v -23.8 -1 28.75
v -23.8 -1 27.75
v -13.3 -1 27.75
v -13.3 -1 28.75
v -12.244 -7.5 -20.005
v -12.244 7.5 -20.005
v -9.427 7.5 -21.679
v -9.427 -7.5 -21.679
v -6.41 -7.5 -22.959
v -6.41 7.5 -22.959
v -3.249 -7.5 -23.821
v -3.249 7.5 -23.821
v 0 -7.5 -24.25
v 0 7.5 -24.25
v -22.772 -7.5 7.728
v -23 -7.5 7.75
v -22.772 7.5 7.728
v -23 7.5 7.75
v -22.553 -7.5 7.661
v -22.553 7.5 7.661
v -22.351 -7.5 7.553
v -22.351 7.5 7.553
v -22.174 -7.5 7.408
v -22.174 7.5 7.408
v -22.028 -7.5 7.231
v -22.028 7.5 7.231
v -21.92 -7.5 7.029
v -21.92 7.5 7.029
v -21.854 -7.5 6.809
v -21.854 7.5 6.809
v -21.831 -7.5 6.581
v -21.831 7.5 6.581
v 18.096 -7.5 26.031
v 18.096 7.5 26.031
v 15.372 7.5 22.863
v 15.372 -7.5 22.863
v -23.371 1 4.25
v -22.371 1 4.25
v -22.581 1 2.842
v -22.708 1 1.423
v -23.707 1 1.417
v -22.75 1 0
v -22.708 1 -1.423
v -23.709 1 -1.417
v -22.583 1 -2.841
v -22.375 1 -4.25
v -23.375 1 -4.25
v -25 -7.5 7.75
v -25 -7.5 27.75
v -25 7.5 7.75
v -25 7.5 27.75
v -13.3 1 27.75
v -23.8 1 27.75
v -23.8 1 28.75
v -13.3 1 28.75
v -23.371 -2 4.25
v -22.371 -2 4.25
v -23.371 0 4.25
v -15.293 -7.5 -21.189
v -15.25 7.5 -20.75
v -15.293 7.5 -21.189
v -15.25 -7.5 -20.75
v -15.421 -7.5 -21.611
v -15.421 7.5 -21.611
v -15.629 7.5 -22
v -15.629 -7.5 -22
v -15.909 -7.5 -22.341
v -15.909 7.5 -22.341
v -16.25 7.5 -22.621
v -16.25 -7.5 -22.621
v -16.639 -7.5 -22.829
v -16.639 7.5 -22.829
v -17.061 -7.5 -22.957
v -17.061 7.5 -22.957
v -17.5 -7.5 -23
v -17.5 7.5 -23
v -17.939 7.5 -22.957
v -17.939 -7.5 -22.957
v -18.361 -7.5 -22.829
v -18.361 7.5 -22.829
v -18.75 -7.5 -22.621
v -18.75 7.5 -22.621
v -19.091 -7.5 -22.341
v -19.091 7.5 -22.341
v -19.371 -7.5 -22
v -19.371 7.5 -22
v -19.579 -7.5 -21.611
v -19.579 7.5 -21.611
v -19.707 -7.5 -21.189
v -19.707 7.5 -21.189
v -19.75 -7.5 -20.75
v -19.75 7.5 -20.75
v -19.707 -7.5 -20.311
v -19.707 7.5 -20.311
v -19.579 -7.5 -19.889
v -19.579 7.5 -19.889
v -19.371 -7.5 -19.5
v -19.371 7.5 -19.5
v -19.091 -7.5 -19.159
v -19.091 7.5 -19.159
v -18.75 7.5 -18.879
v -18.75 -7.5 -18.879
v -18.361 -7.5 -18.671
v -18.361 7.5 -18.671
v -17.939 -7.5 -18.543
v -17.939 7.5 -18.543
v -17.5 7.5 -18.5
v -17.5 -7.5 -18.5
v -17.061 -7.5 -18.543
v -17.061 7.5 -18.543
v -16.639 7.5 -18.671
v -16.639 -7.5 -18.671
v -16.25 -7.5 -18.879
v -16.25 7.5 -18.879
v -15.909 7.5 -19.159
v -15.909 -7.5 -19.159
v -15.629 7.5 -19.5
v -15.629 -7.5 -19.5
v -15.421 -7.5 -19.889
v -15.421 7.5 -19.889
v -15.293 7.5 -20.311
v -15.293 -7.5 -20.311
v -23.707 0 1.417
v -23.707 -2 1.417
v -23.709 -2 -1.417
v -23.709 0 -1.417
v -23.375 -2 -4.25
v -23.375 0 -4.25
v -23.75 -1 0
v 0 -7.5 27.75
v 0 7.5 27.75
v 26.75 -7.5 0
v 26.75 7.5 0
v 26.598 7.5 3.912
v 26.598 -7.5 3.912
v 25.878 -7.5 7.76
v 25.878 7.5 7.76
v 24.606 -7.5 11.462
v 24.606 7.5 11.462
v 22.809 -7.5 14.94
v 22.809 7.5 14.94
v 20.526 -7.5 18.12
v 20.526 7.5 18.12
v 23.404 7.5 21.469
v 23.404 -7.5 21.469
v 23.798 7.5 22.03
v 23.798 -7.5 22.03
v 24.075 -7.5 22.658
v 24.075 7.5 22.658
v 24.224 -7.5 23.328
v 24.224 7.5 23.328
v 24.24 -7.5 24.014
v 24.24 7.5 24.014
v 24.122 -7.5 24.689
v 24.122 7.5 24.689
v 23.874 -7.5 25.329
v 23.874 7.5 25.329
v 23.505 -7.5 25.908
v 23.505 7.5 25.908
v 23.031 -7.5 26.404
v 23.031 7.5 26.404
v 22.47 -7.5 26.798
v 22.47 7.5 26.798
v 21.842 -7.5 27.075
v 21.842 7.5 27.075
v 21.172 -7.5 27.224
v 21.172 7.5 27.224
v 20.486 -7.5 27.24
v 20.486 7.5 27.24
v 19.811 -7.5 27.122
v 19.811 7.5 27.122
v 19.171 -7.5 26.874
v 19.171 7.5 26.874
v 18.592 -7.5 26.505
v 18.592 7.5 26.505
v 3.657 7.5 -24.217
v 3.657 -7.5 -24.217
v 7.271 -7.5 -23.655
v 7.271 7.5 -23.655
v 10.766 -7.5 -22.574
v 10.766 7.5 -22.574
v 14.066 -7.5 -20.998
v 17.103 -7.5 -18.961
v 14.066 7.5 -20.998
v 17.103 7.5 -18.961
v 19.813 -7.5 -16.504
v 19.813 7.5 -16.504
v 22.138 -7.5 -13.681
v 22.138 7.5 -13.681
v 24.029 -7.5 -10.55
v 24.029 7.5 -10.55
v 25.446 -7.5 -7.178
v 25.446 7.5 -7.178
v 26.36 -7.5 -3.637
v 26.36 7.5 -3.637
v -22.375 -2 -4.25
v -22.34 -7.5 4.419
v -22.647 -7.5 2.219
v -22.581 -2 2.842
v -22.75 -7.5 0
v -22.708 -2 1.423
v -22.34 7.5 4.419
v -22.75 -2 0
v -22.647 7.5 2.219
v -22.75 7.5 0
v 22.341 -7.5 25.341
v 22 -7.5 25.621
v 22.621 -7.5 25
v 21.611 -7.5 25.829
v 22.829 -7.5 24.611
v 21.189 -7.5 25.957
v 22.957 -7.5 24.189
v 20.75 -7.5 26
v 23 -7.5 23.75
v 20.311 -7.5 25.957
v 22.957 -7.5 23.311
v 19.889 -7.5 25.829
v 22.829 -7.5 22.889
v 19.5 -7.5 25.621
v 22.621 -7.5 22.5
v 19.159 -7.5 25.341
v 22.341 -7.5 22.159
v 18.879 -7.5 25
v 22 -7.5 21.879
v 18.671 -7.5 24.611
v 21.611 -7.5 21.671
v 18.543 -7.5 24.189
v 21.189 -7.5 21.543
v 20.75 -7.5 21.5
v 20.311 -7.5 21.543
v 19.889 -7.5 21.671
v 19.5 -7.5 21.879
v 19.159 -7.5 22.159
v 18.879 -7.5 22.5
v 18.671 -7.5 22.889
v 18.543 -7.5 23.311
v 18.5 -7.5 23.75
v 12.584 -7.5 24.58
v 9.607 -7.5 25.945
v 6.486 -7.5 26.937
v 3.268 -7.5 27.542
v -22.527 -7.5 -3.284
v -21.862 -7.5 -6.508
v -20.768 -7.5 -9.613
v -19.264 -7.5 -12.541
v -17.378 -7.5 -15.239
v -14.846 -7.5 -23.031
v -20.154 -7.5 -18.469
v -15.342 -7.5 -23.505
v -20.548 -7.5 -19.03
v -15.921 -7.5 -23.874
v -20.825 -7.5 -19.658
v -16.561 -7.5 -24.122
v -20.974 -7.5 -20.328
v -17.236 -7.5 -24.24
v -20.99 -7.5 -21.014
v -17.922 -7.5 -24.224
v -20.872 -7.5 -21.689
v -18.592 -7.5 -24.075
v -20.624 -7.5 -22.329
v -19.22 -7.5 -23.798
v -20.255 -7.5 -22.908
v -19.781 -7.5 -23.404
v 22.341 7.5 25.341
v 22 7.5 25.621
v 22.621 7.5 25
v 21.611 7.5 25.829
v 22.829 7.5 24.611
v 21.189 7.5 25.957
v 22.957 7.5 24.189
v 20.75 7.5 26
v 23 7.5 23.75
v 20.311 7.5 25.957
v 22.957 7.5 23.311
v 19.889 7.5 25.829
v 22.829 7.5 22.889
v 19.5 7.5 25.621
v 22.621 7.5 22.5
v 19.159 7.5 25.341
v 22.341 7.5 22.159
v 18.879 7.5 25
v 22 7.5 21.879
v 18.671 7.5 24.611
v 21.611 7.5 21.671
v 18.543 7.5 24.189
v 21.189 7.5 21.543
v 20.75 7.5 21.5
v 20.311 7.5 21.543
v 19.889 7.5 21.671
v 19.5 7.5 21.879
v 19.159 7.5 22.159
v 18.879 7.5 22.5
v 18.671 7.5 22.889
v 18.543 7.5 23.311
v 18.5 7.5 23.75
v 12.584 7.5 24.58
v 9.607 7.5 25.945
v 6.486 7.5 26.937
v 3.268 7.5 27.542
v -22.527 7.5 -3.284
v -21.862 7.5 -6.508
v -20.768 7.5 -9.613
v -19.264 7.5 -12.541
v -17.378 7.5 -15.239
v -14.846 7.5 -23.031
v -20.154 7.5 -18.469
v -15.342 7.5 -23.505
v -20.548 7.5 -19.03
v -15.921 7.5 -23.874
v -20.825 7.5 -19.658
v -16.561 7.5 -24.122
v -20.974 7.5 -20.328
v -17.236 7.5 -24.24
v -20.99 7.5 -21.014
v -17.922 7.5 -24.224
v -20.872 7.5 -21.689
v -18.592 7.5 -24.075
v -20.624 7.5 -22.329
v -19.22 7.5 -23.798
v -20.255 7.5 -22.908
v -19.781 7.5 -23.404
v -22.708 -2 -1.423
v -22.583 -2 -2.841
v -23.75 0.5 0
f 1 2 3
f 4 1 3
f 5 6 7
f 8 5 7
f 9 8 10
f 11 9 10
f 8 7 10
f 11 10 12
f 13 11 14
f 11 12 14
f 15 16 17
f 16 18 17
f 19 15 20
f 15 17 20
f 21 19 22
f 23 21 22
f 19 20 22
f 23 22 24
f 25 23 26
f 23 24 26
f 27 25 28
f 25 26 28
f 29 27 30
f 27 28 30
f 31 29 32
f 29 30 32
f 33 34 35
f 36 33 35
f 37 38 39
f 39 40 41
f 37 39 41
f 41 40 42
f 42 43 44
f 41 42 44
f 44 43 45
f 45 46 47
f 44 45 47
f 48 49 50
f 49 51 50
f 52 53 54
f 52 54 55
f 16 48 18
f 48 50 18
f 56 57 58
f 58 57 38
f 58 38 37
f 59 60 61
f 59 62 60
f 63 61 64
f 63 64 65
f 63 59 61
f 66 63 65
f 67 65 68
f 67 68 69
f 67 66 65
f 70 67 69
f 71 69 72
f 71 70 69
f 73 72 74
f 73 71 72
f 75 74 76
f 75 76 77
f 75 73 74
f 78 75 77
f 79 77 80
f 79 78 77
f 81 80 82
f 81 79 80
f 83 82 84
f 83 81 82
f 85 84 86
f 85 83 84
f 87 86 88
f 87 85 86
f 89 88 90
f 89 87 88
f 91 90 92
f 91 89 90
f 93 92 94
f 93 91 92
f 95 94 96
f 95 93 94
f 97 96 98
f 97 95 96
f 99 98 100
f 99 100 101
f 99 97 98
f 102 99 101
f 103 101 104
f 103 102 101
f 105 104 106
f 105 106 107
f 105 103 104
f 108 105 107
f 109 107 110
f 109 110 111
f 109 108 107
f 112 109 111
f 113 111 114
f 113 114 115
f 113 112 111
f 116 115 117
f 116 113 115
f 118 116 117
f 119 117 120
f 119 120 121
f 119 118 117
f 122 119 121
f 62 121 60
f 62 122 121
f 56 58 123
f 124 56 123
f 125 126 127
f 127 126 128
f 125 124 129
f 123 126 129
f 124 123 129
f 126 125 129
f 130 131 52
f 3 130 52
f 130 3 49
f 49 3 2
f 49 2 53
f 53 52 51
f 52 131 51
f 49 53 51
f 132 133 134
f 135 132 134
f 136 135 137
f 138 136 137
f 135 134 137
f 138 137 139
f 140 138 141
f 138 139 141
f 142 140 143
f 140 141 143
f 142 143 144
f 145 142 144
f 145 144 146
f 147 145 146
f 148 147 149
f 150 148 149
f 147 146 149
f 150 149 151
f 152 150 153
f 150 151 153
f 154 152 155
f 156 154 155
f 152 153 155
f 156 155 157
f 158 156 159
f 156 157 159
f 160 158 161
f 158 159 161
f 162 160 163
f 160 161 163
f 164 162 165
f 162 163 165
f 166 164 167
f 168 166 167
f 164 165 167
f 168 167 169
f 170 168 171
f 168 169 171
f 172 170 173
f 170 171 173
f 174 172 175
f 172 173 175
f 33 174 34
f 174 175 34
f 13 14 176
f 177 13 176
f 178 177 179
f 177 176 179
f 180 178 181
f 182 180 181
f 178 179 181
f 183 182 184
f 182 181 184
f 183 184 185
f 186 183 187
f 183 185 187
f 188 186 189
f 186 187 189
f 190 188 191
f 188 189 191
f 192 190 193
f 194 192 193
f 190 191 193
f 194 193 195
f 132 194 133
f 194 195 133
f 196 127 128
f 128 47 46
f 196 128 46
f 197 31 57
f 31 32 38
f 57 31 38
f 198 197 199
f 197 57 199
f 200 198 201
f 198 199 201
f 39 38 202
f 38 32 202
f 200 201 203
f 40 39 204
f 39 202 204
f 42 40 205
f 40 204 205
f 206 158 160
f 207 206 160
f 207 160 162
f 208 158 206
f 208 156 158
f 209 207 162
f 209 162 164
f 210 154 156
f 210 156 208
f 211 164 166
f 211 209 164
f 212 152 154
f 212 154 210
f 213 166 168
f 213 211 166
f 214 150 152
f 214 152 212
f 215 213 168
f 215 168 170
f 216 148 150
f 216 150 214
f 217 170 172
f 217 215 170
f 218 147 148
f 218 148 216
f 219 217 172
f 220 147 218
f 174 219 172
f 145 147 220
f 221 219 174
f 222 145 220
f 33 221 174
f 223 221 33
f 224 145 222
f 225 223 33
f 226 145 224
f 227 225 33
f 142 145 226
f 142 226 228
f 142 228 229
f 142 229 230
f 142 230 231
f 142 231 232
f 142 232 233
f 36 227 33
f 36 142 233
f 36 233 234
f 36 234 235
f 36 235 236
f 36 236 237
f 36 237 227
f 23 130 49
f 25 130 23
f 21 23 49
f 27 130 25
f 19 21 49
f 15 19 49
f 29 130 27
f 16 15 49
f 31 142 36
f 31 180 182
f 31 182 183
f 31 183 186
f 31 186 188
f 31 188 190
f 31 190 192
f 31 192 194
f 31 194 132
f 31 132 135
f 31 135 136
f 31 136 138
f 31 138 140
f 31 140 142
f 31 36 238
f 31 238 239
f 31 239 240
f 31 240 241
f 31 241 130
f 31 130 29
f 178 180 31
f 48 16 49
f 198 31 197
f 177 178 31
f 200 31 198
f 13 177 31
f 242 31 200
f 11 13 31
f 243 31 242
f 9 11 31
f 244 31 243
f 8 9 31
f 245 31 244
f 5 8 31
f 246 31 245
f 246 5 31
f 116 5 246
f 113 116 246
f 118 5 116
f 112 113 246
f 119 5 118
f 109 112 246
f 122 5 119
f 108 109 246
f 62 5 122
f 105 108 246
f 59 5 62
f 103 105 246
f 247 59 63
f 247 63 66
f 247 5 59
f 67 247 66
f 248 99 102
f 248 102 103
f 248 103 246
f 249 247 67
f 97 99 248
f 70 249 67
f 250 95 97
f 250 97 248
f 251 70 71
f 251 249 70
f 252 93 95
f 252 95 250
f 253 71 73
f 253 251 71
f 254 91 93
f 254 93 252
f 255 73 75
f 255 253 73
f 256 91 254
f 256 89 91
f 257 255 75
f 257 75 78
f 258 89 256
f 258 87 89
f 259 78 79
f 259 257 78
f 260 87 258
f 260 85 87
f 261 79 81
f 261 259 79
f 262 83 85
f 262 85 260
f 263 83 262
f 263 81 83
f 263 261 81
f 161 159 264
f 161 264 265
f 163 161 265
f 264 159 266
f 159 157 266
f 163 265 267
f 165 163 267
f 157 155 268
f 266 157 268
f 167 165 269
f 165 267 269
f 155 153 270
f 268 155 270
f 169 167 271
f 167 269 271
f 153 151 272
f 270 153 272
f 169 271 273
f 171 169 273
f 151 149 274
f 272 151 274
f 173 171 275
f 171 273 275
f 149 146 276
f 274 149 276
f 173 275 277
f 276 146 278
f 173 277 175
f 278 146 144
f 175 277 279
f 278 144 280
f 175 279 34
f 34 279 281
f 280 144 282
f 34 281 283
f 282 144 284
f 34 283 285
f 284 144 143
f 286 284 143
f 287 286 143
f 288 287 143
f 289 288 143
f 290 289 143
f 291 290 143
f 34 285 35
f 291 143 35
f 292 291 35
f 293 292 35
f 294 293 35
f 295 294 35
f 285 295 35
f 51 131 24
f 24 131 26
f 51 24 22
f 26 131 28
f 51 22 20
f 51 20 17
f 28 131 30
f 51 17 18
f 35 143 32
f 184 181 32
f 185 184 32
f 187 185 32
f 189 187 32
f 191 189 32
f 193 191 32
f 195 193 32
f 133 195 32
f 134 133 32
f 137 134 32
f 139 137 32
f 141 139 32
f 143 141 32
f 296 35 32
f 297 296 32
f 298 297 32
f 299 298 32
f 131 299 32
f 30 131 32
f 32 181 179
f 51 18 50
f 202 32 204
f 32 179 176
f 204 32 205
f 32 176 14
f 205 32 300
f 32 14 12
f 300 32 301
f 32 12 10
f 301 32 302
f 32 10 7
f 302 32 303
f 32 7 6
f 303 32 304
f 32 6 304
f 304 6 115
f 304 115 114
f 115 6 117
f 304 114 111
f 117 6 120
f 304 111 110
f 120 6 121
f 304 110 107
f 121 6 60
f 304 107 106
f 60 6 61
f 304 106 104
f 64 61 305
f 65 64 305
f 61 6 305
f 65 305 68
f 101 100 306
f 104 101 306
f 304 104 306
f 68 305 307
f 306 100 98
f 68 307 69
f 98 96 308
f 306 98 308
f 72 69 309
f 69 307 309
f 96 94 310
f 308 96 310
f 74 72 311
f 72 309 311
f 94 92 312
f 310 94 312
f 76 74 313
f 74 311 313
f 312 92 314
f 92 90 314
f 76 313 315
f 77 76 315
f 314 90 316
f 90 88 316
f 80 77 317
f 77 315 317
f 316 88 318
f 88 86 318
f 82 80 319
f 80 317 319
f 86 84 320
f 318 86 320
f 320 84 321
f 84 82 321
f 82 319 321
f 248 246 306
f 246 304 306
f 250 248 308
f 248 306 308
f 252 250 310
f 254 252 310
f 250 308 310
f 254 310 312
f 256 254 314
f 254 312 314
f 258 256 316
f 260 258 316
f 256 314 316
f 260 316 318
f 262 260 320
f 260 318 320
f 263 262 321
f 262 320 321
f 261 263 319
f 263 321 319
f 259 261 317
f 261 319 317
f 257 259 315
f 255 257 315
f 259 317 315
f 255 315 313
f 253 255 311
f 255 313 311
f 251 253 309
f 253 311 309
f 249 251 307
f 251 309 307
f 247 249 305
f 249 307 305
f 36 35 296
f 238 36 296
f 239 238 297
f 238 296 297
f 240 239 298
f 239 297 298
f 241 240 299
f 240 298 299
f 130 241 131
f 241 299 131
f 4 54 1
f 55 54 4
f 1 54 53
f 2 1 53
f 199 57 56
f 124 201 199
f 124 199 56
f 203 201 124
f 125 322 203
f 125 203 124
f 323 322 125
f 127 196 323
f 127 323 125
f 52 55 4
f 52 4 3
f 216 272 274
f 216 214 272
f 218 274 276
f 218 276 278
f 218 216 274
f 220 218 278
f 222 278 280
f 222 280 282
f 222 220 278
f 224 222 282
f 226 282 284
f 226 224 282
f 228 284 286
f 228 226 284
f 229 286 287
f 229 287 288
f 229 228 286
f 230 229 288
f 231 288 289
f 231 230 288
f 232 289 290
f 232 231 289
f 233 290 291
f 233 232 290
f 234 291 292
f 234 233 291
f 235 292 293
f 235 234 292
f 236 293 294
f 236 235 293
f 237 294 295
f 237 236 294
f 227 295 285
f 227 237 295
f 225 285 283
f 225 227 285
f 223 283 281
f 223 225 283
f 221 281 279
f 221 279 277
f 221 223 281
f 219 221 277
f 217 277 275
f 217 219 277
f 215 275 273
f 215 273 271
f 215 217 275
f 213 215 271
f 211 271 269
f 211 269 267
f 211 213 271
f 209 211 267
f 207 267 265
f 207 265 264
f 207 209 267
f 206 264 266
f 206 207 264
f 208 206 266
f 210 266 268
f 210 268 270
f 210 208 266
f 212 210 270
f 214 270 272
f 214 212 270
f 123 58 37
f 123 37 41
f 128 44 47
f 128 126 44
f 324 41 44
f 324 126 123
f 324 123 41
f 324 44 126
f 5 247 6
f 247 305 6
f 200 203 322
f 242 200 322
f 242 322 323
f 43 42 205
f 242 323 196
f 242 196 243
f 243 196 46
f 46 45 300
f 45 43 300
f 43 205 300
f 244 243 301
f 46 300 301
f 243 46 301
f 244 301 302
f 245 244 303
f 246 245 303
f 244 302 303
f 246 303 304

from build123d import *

# Parameters (mm, degrees)
BOSS_EXTRUDE1_DEPTH      = 7.5
BOSS_EXTRUDE1_DEPTH_BACK = 7.5
SKETCH1_R                = 2.25
BOSS_EXTRUDE2_DEPTH      = 1
BOSS_EXTRUDE2_DEPTH_BACK = 2
BOSS_EXTRUDE3_DEPTH      = 1
BOSS_EXTRUDE3_DEPTH_BACK = 1
SKETCH3_W                = 10.5
SKETCH3_H                = 1


with BuildPart() as part:
    # Sketch1 → Boss-Extrude1 (new, two sides: drawn at the far end of the back side and taken through both)
    with BuildSketch(Plane(origin=(0, 0, 0), x_dir=(1, 0, 0), z_dir=(0, 1, 0)).offset(-BOSS_EXTRUDE1_DEPTH_BACK)):
        with BuildLine():
            Line((0, -27.75), (-25, -27.75))
            Line((-25, -27.75), (-25, -7.75))
            Line((-25, -7.75), (-23, -7.75))
            ThreePointArc((-23, -7.75), (-22.173642142, -7.407711368), (-21.83135351, -6.58135351))
            ThreePointArc((-21.83135351, -6.58135351), (-22.519230493, -3.322579021), (-22.75, 0))
            ThreePointArc((-22.75, 0), (-21.367673649, 8.078905587), (-17.377967793, 15.238639437))
            Line((-17.377967793, 15.238639437), (-20.154237836, 18.468548377))
            ThreePointArc((-20.154237836, 18.468548377), (-19.781451623, 23.404237836), (-14.845762164, 23.031451623))
            Line((-14.845762164, 23.031451623), (-12.244288682, 20.004900775))
            ThreePointArc((-12.244288682, 20.004900775), (-6.410360065, 22.958761116), (0, 24.25))
            ThreePointArc((0, 24.25), (18.502982119, 17.781640069), (26.75, 0))
            ThreePointArc((26.75, 0), (25.310000225, -9.634196337), (20.525571791, -18.119512063))
            Line((20.525571791, -18.119512063), (23.404237836, -21.468548377))
            ThreePointArc((23.404237836, -21.468548377), (23.031451623, -26.404237836), (18.095762164, -26.031451623))
            Line((18.095762164, -26.031451623), (15.372148216, -22.862802716))
            ThreePointArc((15.372148216, -22.862802716), (8.06198842, -26.488798996), (0, -27.75))
        make_face()
        with Locations((-17.5, 20.75)):
            Circle(SKETCH1_R, mode=Mode.SUBTRACT)
        with Locations((20.75, -23.75)):
            Circle(SKETCH1_R, mode=Mode.SUBTRACT)
    extrude(amount=BOSS_EXTRUDE1_DEPTH + BOSS_EXTRUDE1_DEPTH_BACK)

    # Sketch2 → Boss-Extrude2 (add, two sides: drawn at the far end of the back side and taken through both)
    with BuildSketch(Plane(origin=(0, 0, 0), x_dir=(1, 0, 0), z_dir=(0, 1, 0)).offset(-BOSS_EXTRUDE2_DEPTH_BACK)):
        with BuildLine():
            Line((-23.375448552, 4.25), (-22.375448552, 4.25))
            Line((-22.375448552, 4.25), (-20.476060309, 3.242316336))
            Line((-20.476060309, 3.242316336), (-20.106924084, -2.963786455))
            Line((-20.106924084, -2.963786455), (-22.3712513, -4.25))
            Line((-22.3712513, -4.25), (-23.3712513, -4.25))
            add(Edge.make_bspline(
                [(-23.3712513, -4.25), (-24.126649893, -0.000369077), (-23.375448552, 4.25)],
                knots=[0, 0, 0, 1, 1, 1], degree=2))
        make_face()
    extrude(amount=BOSS_EXTRUDE2_DEPTH + BOSS_EXTRUDE2_DEPTH_BACK)

    # Sketch3 → Boss-Extrude3 (add, two sides: drawn at the far end of the back side and taken through both)
    with BuildSketch(Plane(origin=(0, 0, 0), x_dir=(1, 0, 0), z_dir=(0, 1, 0)).offset(-BOSS_EXTRUDE3_DEPTH_BACK)):
        with Locations((-18.55, -28.25)):
            Rectangle(SKETCH3_W, SKETCH3_H)
    extrude(amount=BOSS_EXTRUDE3_DEPTH + BOSS_EXTRUDE3_DEPTH_BACK)


solid = part.part
